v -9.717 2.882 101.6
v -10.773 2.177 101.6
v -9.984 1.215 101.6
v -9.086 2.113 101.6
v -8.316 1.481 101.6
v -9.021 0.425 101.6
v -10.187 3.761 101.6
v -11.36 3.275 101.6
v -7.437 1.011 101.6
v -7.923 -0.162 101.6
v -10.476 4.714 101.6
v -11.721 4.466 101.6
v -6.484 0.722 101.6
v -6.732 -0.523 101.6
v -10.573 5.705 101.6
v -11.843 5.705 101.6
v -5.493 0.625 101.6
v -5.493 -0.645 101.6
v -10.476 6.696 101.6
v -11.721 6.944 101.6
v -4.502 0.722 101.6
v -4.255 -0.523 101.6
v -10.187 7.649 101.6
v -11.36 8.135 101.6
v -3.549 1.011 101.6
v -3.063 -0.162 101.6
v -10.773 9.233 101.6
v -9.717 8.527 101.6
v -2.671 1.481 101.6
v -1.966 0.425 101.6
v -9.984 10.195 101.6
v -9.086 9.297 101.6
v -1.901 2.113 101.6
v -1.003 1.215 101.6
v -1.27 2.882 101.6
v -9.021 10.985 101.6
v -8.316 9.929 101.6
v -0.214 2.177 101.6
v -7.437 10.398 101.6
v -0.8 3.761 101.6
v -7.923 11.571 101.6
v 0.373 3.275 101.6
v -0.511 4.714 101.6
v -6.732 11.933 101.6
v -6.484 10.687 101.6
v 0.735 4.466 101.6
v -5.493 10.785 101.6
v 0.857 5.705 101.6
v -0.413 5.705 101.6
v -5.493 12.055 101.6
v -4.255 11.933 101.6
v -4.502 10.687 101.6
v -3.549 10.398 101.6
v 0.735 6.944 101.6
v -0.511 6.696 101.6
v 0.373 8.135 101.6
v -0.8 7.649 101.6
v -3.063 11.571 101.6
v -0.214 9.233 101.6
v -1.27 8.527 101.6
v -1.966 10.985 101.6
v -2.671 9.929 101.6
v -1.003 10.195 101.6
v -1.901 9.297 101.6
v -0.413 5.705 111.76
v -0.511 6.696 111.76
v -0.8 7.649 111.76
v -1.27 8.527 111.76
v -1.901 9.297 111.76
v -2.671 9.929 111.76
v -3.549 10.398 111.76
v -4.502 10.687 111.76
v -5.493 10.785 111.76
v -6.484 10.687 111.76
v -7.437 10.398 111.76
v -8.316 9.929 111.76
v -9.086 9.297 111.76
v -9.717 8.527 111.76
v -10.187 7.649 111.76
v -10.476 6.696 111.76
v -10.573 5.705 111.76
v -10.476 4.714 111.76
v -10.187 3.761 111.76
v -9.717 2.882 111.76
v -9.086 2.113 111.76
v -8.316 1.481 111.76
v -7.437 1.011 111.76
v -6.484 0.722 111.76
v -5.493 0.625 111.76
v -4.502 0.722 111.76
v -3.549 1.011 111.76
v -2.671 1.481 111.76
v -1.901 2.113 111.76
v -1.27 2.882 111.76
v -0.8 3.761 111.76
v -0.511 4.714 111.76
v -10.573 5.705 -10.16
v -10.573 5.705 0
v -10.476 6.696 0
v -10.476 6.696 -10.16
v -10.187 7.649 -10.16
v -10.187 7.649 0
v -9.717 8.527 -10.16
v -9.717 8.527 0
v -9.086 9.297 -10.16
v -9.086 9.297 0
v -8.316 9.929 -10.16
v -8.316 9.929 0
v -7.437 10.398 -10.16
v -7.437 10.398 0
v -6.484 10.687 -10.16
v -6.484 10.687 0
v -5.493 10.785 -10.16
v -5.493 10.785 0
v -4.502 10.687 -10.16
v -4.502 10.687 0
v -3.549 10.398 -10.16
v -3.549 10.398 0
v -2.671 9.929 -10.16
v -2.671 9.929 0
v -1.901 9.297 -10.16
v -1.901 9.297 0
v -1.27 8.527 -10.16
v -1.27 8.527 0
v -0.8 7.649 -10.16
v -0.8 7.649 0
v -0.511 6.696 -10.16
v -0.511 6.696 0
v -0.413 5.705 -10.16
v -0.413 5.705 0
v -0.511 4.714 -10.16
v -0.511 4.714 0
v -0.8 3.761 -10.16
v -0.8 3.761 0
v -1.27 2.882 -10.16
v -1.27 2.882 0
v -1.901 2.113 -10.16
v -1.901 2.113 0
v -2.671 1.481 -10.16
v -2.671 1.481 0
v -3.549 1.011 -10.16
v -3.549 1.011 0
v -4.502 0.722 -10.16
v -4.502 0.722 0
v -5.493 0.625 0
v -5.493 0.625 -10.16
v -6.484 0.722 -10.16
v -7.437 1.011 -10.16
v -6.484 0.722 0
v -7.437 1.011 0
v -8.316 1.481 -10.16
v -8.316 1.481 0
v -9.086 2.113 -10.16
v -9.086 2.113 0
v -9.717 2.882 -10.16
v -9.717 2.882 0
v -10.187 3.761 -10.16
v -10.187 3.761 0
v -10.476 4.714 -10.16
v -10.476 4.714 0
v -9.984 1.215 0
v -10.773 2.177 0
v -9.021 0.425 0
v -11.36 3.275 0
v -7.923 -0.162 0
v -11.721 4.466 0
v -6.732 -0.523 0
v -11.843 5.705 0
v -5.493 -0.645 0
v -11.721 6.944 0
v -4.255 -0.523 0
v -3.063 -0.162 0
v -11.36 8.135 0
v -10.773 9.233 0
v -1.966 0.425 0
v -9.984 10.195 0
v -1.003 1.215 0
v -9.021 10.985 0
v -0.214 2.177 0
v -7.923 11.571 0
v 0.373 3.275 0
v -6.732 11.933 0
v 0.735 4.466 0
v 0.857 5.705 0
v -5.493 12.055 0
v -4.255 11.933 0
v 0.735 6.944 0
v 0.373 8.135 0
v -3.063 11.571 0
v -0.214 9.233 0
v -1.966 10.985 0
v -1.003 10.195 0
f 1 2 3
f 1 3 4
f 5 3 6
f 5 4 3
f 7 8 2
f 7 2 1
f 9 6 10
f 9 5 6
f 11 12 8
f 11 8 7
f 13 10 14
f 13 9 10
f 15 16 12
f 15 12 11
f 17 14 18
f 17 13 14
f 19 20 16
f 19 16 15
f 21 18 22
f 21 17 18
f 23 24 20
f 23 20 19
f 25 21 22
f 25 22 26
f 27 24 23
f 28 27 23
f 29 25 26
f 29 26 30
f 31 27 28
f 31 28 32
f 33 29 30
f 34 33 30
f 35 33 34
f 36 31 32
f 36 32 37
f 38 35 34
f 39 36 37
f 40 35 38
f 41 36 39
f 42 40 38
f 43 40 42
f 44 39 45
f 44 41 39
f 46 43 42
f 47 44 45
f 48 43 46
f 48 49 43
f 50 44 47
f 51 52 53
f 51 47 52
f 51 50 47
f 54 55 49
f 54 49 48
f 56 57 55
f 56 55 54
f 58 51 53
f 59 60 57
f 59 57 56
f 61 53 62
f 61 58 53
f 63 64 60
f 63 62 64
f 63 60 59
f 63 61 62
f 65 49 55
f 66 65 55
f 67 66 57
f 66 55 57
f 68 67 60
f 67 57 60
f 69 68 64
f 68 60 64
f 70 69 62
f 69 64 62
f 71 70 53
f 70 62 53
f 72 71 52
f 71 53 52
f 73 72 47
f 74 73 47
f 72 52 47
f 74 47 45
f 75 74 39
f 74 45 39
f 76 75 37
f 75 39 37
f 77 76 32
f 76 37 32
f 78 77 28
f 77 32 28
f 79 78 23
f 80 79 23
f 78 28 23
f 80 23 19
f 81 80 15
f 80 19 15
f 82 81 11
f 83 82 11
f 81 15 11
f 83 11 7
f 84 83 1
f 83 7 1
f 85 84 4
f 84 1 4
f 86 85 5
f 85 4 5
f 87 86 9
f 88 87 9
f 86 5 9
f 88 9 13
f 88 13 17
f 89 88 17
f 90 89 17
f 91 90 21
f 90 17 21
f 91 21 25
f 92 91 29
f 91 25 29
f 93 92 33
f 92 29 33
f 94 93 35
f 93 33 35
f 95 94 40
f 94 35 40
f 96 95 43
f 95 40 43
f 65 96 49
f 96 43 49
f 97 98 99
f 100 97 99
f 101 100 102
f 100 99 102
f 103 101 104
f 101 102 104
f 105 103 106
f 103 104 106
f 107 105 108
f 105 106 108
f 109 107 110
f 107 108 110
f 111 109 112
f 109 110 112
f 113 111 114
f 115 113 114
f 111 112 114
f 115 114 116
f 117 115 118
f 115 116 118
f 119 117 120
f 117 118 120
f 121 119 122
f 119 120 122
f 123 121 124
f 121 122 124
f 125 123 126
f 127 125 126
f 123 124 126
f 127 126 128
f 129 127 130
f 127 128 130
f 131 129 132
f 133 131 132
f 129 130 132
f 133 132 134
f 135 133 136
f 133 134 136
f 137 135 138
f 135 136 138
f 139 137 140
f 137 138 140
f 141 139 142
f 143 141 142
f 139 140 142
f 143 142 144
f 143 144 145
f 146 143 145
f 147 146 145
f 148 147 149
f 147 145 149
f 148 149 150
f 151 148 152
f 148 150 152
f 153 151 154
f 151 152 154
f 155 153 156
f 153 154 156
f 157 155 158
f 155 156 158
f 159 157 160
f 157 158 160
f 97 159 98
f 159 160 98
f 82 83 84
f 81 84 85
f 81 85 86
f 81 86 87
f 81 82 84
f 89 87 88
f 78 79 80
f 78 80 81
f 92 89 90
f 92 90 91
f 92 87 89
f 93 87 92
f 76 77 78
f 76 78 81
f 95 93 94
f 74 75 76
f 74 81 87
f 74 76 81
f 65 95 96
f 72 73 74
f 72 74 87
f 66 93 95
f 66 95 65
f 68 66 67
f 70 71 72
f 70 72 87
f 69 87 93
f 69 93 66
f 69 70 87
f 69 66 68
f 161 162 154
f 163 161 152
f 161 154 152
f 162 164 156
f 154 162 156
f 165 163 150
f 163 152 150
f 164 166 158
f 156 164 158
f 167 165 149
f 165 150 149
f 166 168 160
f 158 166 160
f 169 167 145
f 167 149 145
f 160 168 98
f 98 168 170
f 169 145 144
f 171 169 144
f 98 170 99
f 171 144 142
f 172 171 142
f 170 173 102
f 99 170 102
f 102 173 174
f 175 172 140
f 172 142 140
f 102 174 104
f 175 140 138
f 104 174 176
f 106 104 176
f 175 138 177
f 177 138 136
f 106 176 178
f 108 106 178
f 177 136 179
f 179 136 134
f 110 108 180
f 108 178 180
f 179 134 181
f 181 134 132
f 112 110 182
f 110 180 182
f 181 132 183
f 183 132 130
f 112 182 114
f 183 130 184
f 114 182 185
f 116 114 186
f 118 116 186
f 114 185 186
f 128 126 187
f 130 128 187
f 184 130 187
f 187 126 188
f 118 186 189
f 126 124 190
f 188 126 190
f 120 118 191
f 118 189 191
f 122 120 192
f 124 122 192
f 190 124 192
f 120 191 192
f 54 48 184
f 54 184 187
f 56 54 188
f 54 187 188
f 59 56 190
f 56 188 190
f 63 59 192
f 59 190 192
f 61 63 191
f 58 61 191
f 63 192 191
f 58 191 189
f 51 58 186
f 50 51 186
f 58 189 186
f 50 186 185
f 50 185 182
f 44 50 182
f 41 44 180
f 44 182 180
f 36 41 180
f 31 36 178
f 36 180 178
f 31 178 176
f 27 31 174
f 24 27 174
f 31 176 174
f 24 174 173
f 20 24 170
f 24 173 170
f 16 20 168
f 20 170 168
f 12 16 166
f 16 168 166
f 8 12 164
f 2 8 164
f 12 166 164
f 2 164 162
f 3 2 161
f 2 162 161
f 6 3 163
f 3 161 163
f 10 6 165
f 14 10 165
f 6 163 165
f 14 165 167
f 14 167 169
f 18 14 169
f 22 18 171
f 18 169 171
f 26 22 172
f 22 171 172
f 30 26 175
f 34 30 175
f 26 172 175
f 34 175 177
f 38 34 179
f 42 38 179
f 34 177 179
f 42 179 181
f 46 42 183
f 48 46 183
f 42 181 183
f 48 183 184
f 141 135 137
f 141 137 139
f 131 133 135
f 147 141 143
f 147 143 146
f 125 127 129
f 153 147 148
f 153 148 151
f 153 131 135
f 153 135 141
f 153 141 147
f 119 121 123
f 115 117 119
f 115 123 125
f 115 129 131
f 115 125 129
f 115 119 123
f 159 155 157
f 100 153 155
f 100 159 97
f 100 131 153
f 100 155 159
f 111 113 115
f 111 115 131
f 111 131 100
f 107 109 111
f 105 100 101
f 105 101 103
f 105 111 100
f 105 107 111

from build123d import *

# Parameters (mm, degrees)
SKETCH1_R            = 6.35
BOSS_EXTRUDE2_DEPTH  = 101.6
SKETCH5_R            = 5.08
BOSS_EXTRUDE14_DEPTH = 10.16
SKETCH9_R            = 5.08
BOSS_EXTRUDE15_DEPTH = 10.16


with BuildPart() as part:
    # Sketch1 → Boss-Extrude2 (new body)
    with BuildSketch(Plane.XY):
        with Locations((-5.49342359, 5.704709113)):
            Circle(SKETCH1_R)
    extrude(amount=BOSS_EXTRUDE2_DEPTH)

    # Sketch5 → Boss-Extrude14 (add)
    with BuildSketch(Plane.XY.offset(101.6)):
        with Locations((-5.49342359, 5.704709113)):
            Circle(SKETCH5_R)
    extrude(amount=BOSS_EXTRUDE14_DEPTH)

    # Sketch9 → Boss-Extrude15 (add)
    with BuildSketch(Plane(origin=(0, 0, 0), x_dir=(-1, 0, 0), z_dir=(0, 0, -1))):
        with Locations((5.49342359, 5.704709113)):
            Circle(SKETCH9_R)
    extrude(amount=BOSS_EXTRUDE15_DEPTH)


solid = part.part
